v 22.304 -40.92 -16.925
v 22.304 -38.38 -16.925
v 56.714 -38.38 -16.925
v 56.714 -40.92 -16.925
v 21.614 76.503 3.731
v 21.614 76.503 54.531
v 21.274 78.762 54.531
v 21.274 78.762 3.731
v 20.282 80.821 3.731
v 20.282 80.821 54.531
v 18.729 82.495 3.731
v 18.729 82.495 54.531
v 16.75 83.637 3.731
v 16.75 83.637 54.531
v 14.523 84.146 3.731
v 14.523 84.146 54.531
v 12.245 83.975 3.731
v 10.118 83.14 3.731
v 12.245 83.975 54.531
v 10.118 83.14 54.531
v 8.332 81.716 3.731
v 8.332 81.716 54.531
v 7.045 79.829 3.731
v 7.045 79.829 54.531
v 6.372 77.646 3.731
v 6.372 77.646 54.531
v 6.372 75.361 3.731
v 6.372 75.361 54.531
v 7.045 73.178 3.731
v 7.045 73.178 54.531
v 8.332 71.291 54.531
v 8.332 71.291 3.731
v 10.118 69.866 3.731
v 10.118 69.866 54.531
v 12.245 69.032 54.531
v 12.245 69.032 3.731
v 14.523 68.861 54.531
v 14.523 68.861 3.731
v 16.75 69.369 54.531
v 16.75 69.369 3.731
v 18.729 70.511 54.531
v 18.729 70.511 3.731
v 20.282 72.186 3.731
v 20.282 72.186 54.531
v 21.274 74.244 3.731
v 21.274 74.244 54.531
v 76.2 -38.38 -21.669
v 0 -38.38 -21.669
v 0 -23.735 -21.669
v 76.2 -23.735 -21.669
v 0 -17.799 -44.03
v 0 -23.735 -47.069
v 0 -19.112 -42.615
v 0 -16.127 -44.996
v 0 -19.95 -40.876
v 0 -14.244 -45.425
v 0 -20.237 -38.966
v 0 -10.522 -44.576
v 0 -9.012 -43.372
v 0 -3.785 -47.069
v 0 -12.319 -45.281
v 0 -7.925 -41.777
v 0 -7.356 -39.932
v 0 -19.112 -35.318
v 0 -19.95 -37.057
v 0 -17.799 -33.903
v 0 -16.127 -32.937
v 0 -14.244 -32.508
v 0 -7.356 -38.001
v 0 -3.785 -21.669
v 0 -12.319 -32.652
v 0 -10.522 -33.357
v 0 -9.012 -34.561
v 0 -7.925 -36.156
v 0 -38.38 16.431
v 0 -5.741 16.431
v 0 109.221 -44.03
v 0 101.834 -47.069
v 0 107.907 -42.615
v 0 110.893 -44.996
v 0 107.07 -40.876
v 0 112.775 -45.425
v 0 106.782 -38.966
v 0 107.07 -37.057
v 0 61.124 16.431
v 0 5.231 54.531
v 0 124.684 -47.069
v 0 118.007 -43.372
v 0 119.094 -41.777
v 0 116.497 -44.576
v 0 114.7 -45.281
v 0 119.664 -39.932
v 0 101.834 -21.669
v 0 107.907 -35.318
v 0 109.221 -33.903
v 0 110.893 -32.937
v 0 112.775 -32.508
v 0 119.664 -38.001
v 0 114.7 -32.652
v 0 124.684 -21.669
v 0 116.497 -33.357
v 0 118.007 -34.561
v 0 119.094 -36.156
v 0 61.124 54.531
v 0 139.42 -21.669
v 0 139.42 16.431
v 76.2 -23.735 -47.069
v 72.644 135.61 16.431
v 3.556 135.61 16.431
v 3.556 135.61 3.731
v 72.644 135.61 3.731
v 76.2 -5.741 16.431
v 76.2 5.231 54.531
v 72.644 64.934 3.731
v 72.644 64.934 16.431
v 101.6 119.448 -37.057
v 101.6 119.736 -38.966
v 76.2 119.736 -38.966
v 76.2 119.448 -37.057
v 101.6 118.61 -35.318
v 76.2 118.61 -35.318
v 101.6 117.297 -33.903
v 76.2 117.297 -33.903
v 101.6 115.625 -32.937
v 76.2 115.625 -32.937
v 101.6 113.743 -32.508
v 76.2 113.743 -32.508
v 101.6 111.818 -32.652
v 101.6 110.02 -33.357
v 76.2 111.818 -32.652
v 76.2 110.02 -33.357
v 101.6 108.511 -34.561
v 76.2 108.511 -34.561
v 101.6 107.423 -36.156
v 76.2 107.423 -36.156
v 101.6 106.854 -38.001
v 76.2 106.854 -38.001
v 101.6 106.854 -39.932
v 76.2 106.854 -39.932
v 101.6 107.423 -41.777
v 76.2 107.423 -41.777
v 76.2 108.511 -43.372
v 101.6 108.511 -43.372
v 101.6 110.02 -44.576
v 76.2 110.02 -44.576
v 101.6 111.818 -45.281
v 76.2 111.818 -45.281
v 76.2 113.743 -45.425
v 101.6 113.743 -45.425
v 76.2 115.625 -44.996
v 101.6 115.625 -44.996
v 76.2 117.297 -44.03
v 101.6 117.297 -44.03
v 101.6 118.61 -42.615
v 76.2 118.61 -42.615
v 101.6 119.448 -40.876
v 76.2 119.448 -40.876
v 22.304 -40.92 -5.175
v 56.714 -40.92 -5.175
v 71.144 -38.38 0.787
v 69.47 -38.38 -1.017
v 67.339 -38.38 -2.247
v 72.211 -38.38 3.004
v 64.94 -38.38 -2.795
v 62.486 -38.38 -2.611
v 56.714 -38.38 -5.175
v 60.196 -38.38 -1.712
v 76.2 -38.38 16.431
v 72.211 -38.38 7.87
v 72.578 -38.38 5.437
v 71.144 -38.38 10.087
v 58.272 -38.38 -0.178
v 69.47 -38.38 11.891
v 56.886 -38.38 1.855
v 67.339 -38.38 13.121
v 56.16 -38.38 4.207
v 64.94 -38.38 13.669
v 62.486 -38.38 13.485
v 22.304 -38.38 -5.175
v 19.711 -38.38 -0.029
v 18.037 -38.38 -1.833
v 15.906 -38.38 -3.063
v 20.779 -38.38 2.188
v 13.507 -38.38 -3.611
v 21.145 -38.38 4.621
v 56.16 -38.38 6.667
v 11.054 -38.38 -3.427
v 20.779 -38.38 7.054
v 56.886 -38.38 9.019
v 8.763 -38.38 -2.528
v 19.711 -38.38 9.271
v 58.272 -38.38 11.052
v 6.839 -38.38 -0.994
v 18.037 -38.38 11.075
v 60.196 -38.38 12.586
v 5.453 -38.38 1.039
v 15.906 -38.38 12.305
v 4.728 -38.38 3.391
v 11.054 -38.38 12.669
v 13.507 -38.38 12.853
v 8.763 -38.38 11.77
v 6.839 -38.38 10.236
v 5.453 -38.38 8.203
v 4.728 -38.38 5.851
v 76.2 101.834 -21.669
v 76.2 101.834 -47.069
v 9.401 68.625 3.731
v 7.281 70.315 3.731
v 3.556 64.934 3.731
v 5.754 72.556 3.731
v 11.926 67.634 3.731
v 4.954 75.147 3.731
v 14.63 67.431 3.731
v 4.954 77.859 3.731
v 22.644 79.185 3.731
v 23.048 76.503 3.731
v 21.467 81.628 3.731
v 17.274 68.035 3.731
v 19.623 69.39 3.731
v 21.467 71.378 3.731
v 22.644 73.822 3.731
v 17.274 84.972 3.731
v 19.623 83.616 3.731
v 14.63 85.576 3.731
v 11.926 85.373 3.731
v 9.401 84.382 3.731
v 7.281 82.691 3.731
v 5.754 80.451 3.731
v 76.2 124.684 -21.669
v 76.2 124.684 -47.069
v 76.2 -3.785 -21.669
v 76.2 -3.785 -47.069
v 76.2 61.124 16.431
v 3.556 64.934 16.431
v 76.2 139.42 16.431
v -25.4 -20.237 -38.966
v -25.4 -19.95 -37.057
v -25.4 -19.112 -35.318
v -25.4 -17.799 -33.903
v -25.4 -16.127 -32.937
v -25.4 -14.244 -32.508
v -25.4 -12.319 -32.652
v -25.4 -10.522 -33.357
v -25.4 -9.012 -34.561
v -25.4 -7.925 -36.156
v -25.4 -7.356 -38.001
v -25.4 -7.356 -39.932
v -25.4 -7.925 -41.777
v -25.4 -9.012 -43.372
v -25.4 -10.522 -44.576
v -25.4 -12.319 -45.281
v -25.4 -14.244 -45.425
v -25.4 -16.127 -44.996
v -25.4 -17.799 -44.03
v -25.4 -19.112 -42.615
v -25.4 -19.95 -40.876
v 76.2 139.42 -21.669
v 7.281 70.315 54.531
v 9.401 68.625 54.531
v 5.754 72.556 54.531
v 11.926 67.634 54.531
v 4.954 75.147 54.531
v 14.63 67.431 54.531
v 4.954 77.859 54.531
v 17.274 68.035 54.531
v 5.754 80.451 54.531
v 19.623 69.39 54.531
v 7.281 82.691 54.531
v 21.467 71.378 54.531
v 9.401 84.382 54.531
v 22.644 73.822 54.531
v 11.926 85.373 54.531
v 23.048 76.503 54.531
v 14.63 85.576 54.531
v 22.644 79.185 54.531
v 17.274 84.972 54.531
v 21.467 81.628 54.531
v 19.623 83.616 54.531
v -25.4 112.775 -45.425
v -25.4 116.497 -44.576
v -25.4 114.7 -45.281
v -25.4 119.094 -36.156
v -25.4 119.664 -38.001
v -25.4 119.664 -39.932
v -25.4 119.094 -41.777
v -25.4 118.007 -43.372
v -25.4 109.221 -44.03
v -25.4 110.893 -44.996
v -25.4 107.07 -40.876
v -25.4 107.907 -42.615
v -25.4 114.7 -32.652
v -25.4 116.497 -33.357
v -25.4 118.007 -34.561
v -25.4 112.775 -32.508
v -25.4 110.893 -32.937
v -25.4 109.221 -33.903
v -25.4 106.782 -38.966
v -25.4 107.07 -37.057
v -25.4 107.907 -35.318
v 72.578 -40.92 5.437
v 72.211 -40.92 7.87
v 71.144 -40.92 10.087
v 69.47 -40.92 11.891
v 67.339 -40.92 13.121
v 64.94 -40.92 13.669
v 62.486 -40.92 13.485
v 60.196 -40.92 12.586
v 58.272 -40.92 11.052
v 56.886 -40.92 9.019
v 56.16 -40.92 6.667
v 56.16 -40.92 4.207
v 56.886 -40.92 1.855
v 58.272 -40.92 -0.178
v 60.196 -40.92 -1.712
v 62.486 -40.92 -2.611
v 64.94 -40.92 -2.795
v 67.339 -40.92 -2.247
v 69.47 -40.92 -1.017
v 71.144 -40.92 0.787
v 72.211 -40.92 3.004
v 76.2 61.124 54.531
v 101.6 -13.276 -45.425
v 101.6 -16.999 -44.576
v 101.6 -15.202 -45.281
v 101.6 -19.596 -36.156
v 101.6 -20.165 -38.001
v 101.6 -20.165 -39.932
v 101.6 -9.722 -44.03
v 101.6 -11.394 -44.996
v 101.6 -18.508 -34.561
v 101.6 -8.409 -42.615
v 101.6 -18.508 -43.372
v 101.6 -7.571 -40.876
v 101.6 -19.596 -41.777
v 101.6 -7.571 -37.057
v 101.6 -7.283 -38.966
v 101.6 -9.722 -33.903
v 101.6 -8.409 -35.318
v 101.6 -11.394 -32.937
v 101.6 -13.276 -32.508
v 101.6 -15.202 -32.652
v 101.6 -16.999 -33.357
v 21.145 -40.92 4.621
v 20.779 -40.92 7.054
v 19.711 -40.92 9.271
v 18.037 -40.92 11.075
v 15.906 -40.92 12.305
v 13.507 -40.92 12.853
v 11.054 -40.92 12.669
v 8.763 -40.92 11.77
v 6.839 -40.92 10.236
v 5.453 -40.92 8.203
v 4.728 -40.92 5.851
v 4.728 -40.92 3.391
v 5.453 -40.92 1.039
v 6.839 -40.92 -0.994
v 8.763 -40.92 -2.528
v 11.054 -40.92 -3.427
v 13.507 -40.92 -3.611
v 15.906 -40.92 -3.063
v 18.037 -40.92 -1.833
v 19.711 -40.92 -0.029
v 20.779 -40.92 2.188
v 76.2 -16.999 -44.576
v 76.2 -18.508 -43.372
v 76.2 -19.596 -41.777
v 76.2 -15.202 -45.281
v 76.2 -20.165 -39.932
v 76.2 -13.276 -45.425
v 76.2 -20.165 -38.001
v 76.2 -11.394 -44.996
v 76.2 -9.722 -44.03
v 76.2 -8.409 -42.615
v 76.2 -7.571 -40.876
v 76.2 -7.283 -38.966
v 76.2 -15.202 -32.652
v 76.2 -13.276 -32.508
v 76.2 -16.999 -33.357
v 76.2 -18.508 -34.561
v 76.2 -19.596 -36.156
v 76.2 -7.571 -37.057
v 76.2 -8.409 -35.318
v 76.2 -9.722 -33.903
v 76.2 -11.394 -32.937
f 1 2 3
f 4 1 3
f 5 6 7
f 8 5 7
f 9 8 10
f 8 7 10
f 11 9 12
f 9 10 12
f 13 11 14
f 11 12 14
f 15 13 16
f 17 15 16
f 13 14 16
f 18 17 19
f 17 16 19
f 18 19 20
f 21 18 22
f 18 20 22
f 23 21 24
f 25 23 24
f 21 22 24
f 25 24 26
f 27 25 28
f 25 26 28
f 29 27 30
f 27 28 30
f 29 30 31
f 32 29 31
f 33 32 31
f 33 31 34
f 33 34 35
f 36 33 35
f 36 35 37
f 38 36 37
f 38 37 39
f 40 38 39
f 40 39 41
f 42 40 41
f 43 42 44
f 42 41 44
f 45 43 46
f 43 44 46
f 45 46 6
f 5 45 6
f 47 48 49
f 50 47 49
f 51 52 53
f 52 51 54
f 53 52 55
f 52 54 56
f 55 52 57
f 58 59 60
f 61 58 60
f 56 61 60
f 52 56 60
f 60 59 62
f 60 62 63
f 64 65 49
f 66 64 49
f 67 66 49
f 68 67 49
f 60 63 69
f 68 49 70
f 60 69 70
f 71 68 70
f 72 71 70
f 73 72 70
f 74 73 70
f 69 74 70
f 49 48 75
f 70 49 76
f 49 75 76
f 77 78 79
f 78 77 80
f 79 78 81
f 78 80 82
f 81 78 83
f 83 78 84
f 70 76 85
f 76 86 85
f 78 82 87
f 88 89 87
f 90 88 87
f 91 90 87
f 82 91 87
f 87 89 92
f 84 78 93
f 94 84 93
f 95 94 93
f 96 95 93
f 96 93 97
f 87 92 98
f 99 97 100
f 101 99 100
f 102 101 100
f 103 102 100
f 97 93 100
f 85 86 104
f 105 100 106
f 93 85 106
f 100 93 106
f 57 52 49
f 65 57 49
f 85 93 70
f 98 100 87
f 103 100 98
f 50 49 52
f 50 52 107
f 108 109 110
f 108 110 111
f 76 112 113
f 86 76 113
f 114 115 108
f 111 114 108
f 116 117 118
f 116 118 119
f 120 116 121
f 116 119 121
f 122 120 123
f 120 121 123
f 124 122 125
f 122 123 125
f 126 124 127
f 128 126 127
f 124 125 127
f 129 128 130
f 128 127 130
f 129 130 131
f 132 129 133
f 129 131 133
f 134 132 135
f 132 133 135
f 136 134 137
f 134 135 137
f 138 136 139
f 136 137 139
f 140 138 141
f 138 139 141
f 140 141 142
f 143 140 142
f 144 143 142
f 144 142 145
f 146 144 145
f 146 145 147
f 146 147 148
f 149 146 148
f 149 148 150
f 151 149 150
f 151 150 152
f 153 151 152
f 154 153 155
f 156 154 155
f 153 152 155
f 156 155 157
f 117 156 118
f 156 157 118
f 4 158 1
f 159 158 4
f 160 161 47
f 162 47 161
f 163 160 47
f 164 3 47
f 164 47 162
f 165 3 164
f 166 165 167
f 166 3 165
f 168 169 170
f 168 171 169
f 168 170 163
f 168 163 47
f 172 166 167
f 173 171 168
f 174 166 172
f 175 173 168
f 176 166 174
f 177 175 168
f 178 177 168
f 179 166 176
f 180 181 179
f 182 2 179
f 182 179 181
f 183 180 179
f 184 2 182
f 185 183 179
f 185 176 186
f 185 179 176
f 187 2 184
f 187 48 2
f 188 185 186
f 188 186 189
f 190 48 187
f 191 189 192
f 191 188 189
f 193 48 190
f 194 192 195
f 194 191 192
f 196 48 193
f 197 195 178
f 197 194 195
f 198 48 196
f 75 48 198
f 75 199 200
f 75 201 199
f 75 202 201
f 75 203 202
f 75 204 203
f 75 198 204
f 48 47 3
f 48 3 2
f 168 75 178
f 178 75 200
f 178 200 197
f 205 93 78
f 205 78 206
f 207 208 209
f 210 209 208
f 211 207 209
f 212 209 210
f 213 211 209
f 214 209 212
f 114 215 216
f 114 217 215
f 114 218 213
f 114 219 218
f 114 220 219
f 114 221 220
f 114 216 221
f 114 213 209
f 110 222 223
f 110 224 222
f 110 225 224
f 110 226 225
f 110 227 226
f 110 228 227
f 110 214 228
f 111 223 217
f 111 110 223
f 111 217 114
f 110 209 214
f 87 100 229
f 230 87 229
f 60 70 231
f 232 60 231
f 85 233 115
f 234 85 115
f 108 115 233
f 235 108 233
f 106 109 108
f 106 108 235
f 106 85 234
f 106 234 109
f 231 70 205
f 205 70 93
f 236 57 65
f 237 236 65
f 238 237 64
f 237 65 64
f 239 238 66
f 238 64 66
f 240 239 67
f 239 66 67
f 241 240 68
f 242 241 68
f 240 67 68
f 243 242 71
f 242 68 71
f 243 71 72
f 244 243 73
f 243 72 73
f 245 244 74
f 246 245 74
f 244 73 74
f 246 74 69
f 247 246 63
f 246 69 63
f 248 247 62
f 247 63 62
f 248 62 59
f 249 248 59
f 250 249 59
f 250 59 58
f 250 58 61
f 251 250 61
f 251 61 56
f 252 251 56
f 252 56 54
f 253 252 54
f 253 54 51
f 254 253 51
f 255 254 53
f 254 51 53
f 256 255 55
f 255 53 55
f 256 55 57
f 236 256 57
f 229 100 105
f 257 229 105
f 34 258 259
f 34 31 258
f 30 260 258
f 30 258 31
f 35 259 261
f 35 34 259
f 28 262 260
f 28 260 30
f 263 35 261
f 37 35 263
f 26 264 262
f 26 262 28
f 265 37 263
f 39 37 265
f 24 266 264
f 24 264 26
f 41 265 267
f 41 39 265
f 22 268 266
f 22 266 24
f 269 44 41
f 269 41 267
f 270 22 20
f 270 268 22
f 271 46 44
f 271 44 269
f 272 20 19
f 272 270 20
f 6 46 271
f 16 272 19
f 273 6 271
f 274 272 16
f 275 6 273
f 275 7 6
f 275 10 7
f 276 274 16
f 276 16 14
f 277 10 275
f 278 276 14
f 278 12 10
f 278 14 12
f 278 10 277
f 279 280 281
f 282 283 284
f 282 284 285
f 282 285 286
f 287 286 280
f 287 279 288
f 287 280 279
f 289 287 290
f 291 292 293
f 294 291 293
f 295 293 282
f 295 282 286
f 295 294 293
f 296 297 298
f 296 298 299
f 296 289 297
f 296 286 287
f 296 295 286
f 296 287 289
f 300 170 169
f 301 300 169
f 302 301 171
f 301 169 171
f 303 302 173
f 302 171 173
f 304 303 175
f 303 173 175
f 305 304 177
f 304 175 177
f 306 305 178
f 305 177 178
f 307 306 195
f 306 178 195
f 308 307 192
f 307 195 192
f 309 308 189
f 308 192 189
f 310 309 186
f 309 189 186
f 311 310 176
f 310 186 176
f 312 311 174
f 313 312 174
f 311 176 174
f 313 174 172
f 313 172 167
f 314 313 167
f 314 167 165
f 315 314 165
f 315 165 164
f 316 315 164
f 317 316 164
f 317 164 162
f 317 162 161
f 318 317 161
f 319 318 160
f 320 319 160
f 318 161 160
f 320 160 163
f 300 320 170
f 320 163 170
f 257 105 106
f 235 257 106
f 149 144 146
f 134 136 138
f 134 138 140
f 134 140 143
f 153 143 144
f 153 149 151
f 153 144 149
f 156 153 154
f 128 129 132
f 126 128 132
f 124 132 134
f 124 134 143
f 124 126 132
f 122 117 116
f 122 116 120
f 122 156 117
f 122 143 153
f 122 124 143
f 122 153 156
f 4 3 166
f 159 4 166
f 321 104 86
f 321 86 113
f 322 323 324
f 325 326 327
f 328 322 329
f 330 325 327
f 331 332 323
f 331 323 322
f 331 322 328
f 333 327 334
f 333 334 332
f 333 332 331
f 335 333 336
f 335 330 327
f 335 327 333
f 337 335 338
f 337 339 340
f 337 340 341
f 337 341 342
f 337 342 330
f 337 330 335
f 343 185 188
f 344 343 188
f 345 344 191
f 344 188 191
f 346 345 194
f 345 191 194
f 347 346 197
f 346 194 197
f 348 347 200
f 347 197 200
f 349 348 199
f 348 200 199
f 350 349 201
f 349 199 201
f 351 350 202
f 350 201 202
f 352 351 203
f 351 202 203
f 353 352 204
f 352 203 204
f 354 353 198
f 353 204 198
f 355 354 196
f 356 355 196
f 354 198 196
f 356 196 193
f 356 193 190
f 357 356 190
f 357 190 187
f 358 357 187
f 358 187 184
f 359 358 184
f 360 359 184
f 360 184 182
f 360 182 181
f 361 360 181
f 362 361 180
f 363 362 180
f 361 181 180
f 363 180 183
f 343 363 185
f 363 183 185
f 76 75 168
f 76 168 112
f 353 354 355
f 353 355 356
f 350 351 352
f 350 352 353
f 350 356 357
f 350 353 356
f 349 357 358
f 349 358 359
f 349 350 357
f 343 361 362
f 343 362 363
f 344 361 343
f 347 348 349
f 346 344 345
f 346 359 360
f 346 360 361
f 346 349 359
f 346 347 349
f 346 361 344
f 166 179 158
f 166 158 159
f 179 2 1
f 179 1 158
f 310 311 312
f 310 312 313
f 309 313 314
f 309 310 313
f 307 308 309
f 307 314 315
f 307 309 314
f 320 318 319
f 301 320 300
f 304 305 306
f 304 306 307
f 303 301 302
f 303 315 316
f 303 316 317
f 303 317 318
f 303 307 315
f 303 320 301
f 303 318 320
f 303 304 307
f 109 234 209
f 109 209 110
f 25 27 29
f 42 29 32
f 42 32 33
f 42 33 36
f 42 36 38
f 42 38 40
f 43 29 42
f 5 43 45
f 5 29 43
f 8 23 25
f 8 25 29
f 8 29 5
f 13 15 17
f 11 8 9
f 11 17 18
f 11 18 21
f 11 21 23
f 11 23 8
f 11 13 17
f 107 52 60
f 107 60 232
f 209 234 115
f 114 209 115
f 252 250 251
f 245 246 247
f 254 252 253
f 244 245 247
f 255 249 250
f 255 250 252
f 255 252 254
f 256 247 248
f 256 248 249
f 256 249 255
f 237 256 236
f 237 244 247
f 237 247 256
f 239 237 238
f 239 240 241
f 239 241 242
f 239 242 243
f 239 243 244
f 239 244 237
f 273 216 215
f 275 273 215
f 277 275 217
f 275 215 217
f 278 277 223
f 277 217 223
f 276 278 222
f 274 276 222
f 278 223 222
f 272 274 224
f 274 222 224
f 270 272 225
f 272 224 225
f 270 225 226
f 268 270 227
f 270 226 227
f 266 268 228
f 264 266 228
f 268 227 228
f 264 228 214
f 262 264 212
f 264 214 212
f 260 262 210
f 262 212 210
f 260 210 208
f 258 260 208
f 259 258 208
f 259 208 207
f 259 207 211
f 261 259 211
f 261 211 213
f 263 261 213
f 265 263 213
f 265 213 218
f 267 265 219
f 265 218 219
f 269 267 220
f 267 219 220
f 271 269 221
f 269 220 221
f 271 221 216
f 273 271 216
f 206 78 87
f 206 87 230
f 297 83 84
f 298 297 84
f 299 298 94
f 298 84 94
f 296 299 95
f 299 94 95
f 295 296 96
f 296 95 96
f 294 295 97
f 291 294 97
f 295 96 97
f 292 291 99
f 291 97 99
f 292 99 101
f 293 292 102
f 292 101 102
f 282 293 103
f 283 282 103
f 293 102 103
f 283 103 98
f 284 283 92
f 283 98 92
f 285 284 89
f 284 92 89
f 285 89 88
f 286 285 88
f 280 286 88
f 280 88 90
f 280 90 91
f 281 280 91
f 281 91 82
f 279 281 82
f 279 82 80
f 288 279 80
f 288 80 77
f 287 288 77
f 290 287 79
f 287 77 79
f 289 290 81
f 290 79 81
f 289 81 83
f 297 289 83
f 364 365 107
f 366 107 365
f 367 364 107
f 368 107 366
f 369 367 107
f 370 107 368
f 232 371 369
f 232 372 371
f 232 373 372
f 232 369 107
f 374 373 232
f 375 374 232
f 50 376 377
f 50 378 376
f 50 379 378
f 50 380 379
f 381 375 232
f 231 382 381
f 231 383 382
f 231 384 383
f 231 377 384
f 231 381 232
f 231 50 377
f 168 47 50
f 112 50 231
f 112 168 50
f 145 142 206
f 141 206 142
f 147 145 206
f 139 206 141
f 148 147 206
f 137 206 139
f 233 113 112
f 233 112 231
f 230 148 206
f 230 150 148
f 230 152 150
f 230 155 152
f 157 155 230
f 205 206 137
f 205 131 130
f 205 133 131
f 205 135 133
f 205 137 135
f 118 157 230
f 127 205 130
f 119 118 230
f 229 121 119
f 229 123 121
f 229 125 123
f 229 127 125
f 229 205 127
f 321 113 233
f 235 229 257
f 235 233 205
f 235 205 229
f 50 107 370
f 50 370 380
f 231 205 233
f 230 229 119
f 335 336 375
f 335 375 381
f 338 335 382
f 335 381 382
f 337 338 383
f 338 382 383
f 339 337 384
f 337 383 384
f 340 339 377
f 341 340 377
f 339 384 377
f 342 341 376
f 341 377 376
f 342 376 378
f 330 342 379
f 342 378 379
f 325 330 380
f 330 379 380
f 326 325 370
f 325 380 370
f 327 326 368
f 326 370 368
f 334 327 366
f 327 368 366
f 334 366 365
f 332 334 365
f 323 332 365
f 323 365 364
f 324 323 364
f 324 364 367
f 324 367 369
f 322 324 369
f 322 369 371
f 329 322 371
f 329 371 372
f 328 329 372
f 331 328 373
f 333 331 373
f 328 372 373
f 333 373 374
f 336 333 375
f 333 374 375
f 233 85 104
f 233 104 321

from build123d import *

# Parameters (mm, degrees)
F0_W      = 177.8
F0_H      = 38.1
F1_DEPTH  = 76.2
F2_W      = 76.2
F2_H      = 66.864574
F3_DEPTH  = 38.1
F5_DEPTH  = 101.6
F6_R      = 8.255
F6_W      = 34.409892
F6_H      = 11.749721
F7_DEPTH  = 2.54
F8_W      = 69.088
F8_H      = 70.676456
F9_DEPTH  = 12.7
F10_R     = 9.097669
F11_DEPTH = 50.8
F12_R     = 7.663918
F13_DEPTH = 50.8
F14_W     = 76.2
F14_H     = 22.849783
F14_H_2   = 19.950157
F15_DEPTH = 25.4
F16_R     = 6.477
F17_DEPTH = 25.4
F18_R     = 6.477
F19_DEPTH = 25.4


with BuildPart() as f1:
    # F0 (on Right) → F1 (new body)
    with BuildSketch(Plane.YZ):
        with Locations((50.520241, -2.619057)):
            Rectangle(F0_W, F0_H)
    extrude(amount=F1_DEPTH)

    # F2 (on face) → F3 (join)
    with BuildSketch(Plane.XY.offset(16.430943)):
        with Locations((38.1, 27.691498)):
            Rectangle(F2_W, F2_H)
    extrude(amount=F3_DEPTH)

    # F4 (on face) → F5 (cut)
    with BuildSketch(Plane.YZ.offset(76.2)):
        Polygon((-5.740789, 54.530943), (-5.740789, 16.430943), (5.230976, 54.530943), align=None)
    extrude(amount=-F5_DEPTH, mode=Mode.SUBTRACT)

    # F6 (on face) → F7 (join)
    with BuildSketch(Plane.XZ.offset(38.379759)):
        with Locations((12.890441, 4.621061)):
            Circle(F6_R)
        with Locations((64.323008, 5.436914)):
            Circle(F6_R)
        with Locations((39.508564, -11.050332)):
            Rectangle(F6_W, F6_H)
    extrude(amount=F7_DEPTH)

    # F8 (on face) → F9 (cut)
    with BuildSketch(Plane.XY.offset(16.430943)):
        with Locations((38.1, 100.272013)):
            Rectangle(F8_W, F8_H)
    extrude(amount=-F9_DEPTH, mode=Mode.SUBTRACT)

    # F10 (on face) → F11 (join)
    with BuildSketch(Plane.XY.offset(3.730943)):
        with Locations((13.950241, 76.503314)):
            Circle(F10_R)
    extrude(amount=F11_DEPTH)

    # F12 (on face) → F13 (cut)
    with BuildSketch(Plane.XY.offset(54.530943)):
        with Locations((13.950241, 76.503314)):
            Circle(F12_R)
    extrude(amount=-F13_DEPTH, mode=Mode.SUBTRACT)

    # F14 (on face) → F15 (join)
    with BuildSketch(Plane(origin=(0, 0, -21.669057), x_dir=(1, 0, 0), z_dir=(0, 0, -1))):
        with Locations((38.1, -113.258853)):
            Rectangle(F14_W, F14_H)
        with Locations((38.1, 13.76035)):
            Rectangle(F14_W, F14_H_2)
    extrude(amount=F15_DEPTH)

    # F16 (on face) → F17 (join)
    with BuildSketch(Plane.YZ.offset(76.2)):
        with Locations((-13.76035, -38.966457)):
            Circle(F16_R)
        with Locations((113.258854, -38.966457)):
            Circle(F16_R)
    extrude(amount=F17_DEPTH)

    # F18 (on face) → F19 (join)
    with BuildSketch(Plane(origin=(0, 0, 0), x_dir=(0, -1, 0), z_dir=(-1, 0, 0))):
        with Locations((-113.258854, -38.966457)):
            Circle(F18_R)
        with Locations((13.76035, -38.966457)):
            Circle(F18_R)
    extrude(amount=F19_DEPTH)


solid = f1.part
